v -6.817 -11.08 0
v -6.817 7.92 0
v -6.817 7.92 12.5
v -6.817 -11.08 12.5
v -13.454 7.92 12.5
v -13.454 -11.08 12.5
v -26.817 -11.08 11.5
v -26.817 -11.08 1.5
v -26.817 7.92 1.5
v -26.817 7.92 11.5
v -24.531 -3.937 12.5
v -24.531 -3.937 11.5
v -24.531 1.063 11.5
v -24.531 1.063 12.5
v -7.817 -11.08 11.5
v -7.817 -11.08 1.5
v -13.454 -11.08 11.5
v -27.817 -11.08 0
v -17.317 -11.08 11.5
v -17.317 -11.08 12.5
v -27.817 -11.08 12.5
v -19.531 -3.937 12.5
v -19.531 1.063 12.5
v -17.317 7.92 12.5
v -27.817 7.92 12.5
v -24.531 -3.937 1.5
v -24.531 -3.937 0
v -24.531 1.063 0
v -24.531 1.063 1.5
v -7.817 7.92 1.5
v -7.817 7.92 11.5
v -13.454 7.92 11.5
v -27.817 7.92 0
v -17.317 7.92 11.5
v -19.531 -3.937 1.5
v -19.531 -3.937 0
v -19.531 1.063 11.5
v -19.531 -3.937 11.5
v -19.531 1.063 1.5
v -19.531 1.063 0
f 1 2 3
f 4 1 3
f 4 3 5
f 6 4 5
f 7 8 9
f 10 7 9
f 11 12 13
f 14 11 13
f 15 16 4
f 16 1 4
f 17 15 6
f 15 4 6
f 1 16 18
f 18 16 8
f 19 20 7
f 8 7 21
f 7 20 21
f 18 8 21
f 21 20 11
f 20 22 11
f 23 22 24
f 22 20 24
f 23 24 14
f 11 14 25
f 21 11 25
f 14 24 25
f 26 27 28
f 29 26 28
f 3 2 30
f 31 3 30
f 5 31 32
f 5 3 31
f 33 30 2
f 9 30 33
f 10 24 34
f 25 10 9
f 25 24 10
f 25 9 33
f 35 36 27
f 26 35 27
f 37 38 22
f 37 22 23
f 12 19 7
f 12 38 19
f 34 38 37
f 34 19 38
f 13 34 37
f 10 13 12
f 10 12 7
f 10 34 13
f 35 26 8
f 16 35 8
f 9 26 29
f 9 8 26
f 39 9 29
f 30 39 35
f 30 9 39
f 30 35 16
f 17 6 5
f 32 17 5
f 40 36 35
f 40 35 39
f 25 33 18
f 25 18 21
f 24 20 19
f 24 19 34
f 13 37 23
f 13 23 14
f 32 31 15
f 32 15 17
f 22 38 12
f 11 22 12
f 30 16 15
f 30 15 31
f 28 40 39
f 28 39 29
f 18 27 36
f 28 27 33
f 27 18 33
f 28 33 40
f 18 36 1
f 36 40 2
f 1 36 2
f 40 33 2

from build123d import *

# Parameters (mm, degrees)
SKETCH1_W                = 19
SKETCH1_H                = 19
BOSS_EXTRUDE1_DEPTH      = 1.5
SKETCH2_W                = 5
SKETCH2_H                = 5
CUT_EXTRUDE1_DEPTH       = 30.054329533
BOSS_EXTRUDE2_DEPTH      = 10
BOSS_EXTRUDE2_DEPTH_BACK = 1.5
SKETCH4_W                = 1
SKETCH4_H                = 19
SKETCH5_W                = 21
SKETCH5_H                = 1
BOSS_EXTRUDE3_DEPTH      = 19
SKETCH6_W                = 5
SKETCH6_H                = 5
CUT_EXTRUDE2_DEPTH       = 33.074717791
SKETCH7_W                = 3.862532253
SKETCH7_H                = 19
CUT_EXTRUDE3_DEPTH       = 1


with BuildPart() as part:
    # Sketch1 → Boss-Extrude1 (new body)
    with BuildSketch(Plane.XY):
        with Locations((-17.316728365, -1.580033592)):
            Rectangle(SKETCH1_W, SKETCH1_H)
    extrude(amount=BOSS_EXTRUDE1_DEPTH)

    # Sketch2 → Cut-Extrude1 (cut, through all)
    with BuildSketch(Plane(origin=(0, 0, 0), x_dir=(-1, 0, 0), z_dir=(0, 0, -1))):
        with Locations((22.031286711, -1.437353134)):
            Rectangle(SKETCH2_W, SKETCH2_H)
    extrude(amount=-CUT_EXTRUDE1_DEPTH, mode=Mode.SUBTRACT)

    # Sketch4 → Boss-Extrude2 (add, two sides: drawn at the far end of the back side and taken through both)
    with BuildSketch(Plane.XY.offset(1.5).offset(-BOSS_EXTRUDE2_DEPTH_BACK)):
        with Locations((-7.316728365, -1.580033592)):
            Rectangle(SKETCH4_W, SKETCH4_H)
        with Locations((-27.316728365, -1.580033592)):
            Rectangle(SKETCH4_W, SKETCH4_H)
    extrude(amount=BOSS_EXTRUDE2_DEPTH + BOSS_EXTRUDE2_DEPTH_BACK)

    # Sketch5 → Boss-Extrude3 (add)
    with BuildSketch(Plane(origin=(0, 7.919966408, 0), x_dir=(-1, 0, 0), z_dir=(0, 1, 0))):
        with Locations((17.316728365, 12)):
            Rectangle(SKETCH5_W, SKETCH5_H)
    extrude(amount=-BOSS_EXTRUDE3_DEPTH)

    # Sketch6 → Cut-Extrude2 (cut, through all)
    with BuildSketch(Plane(origin=(0, 0, 11.5), x_dir=(-1, 0, 0), z_dir=(0, 0, -1))):
        with Locations((22.031286711, -1.437353134)):
            Rectangle(SKETCH6_W, SKETCH6_H)
    extrude(amount=-CUT_EXTRUDE2_DEPTH, mode=Mode.SUBTRACT)

    # Sketch7 → Cut-Extrude3 (cut)
    with BuildSketch(Plane(origin=(0, 0, 12.5), x_dir=(-1, 0, 0), z_dir=(0, 0, -1))):
        with Locations((15.385462239, -1.580033592)):
            Rectangle(SKETCH7_W, SKETCH7_H)
    extrude(amount=CUT_EXTRUDE3_DEPTH, mode=Mode.SUBTRACT)


solid = part.part
